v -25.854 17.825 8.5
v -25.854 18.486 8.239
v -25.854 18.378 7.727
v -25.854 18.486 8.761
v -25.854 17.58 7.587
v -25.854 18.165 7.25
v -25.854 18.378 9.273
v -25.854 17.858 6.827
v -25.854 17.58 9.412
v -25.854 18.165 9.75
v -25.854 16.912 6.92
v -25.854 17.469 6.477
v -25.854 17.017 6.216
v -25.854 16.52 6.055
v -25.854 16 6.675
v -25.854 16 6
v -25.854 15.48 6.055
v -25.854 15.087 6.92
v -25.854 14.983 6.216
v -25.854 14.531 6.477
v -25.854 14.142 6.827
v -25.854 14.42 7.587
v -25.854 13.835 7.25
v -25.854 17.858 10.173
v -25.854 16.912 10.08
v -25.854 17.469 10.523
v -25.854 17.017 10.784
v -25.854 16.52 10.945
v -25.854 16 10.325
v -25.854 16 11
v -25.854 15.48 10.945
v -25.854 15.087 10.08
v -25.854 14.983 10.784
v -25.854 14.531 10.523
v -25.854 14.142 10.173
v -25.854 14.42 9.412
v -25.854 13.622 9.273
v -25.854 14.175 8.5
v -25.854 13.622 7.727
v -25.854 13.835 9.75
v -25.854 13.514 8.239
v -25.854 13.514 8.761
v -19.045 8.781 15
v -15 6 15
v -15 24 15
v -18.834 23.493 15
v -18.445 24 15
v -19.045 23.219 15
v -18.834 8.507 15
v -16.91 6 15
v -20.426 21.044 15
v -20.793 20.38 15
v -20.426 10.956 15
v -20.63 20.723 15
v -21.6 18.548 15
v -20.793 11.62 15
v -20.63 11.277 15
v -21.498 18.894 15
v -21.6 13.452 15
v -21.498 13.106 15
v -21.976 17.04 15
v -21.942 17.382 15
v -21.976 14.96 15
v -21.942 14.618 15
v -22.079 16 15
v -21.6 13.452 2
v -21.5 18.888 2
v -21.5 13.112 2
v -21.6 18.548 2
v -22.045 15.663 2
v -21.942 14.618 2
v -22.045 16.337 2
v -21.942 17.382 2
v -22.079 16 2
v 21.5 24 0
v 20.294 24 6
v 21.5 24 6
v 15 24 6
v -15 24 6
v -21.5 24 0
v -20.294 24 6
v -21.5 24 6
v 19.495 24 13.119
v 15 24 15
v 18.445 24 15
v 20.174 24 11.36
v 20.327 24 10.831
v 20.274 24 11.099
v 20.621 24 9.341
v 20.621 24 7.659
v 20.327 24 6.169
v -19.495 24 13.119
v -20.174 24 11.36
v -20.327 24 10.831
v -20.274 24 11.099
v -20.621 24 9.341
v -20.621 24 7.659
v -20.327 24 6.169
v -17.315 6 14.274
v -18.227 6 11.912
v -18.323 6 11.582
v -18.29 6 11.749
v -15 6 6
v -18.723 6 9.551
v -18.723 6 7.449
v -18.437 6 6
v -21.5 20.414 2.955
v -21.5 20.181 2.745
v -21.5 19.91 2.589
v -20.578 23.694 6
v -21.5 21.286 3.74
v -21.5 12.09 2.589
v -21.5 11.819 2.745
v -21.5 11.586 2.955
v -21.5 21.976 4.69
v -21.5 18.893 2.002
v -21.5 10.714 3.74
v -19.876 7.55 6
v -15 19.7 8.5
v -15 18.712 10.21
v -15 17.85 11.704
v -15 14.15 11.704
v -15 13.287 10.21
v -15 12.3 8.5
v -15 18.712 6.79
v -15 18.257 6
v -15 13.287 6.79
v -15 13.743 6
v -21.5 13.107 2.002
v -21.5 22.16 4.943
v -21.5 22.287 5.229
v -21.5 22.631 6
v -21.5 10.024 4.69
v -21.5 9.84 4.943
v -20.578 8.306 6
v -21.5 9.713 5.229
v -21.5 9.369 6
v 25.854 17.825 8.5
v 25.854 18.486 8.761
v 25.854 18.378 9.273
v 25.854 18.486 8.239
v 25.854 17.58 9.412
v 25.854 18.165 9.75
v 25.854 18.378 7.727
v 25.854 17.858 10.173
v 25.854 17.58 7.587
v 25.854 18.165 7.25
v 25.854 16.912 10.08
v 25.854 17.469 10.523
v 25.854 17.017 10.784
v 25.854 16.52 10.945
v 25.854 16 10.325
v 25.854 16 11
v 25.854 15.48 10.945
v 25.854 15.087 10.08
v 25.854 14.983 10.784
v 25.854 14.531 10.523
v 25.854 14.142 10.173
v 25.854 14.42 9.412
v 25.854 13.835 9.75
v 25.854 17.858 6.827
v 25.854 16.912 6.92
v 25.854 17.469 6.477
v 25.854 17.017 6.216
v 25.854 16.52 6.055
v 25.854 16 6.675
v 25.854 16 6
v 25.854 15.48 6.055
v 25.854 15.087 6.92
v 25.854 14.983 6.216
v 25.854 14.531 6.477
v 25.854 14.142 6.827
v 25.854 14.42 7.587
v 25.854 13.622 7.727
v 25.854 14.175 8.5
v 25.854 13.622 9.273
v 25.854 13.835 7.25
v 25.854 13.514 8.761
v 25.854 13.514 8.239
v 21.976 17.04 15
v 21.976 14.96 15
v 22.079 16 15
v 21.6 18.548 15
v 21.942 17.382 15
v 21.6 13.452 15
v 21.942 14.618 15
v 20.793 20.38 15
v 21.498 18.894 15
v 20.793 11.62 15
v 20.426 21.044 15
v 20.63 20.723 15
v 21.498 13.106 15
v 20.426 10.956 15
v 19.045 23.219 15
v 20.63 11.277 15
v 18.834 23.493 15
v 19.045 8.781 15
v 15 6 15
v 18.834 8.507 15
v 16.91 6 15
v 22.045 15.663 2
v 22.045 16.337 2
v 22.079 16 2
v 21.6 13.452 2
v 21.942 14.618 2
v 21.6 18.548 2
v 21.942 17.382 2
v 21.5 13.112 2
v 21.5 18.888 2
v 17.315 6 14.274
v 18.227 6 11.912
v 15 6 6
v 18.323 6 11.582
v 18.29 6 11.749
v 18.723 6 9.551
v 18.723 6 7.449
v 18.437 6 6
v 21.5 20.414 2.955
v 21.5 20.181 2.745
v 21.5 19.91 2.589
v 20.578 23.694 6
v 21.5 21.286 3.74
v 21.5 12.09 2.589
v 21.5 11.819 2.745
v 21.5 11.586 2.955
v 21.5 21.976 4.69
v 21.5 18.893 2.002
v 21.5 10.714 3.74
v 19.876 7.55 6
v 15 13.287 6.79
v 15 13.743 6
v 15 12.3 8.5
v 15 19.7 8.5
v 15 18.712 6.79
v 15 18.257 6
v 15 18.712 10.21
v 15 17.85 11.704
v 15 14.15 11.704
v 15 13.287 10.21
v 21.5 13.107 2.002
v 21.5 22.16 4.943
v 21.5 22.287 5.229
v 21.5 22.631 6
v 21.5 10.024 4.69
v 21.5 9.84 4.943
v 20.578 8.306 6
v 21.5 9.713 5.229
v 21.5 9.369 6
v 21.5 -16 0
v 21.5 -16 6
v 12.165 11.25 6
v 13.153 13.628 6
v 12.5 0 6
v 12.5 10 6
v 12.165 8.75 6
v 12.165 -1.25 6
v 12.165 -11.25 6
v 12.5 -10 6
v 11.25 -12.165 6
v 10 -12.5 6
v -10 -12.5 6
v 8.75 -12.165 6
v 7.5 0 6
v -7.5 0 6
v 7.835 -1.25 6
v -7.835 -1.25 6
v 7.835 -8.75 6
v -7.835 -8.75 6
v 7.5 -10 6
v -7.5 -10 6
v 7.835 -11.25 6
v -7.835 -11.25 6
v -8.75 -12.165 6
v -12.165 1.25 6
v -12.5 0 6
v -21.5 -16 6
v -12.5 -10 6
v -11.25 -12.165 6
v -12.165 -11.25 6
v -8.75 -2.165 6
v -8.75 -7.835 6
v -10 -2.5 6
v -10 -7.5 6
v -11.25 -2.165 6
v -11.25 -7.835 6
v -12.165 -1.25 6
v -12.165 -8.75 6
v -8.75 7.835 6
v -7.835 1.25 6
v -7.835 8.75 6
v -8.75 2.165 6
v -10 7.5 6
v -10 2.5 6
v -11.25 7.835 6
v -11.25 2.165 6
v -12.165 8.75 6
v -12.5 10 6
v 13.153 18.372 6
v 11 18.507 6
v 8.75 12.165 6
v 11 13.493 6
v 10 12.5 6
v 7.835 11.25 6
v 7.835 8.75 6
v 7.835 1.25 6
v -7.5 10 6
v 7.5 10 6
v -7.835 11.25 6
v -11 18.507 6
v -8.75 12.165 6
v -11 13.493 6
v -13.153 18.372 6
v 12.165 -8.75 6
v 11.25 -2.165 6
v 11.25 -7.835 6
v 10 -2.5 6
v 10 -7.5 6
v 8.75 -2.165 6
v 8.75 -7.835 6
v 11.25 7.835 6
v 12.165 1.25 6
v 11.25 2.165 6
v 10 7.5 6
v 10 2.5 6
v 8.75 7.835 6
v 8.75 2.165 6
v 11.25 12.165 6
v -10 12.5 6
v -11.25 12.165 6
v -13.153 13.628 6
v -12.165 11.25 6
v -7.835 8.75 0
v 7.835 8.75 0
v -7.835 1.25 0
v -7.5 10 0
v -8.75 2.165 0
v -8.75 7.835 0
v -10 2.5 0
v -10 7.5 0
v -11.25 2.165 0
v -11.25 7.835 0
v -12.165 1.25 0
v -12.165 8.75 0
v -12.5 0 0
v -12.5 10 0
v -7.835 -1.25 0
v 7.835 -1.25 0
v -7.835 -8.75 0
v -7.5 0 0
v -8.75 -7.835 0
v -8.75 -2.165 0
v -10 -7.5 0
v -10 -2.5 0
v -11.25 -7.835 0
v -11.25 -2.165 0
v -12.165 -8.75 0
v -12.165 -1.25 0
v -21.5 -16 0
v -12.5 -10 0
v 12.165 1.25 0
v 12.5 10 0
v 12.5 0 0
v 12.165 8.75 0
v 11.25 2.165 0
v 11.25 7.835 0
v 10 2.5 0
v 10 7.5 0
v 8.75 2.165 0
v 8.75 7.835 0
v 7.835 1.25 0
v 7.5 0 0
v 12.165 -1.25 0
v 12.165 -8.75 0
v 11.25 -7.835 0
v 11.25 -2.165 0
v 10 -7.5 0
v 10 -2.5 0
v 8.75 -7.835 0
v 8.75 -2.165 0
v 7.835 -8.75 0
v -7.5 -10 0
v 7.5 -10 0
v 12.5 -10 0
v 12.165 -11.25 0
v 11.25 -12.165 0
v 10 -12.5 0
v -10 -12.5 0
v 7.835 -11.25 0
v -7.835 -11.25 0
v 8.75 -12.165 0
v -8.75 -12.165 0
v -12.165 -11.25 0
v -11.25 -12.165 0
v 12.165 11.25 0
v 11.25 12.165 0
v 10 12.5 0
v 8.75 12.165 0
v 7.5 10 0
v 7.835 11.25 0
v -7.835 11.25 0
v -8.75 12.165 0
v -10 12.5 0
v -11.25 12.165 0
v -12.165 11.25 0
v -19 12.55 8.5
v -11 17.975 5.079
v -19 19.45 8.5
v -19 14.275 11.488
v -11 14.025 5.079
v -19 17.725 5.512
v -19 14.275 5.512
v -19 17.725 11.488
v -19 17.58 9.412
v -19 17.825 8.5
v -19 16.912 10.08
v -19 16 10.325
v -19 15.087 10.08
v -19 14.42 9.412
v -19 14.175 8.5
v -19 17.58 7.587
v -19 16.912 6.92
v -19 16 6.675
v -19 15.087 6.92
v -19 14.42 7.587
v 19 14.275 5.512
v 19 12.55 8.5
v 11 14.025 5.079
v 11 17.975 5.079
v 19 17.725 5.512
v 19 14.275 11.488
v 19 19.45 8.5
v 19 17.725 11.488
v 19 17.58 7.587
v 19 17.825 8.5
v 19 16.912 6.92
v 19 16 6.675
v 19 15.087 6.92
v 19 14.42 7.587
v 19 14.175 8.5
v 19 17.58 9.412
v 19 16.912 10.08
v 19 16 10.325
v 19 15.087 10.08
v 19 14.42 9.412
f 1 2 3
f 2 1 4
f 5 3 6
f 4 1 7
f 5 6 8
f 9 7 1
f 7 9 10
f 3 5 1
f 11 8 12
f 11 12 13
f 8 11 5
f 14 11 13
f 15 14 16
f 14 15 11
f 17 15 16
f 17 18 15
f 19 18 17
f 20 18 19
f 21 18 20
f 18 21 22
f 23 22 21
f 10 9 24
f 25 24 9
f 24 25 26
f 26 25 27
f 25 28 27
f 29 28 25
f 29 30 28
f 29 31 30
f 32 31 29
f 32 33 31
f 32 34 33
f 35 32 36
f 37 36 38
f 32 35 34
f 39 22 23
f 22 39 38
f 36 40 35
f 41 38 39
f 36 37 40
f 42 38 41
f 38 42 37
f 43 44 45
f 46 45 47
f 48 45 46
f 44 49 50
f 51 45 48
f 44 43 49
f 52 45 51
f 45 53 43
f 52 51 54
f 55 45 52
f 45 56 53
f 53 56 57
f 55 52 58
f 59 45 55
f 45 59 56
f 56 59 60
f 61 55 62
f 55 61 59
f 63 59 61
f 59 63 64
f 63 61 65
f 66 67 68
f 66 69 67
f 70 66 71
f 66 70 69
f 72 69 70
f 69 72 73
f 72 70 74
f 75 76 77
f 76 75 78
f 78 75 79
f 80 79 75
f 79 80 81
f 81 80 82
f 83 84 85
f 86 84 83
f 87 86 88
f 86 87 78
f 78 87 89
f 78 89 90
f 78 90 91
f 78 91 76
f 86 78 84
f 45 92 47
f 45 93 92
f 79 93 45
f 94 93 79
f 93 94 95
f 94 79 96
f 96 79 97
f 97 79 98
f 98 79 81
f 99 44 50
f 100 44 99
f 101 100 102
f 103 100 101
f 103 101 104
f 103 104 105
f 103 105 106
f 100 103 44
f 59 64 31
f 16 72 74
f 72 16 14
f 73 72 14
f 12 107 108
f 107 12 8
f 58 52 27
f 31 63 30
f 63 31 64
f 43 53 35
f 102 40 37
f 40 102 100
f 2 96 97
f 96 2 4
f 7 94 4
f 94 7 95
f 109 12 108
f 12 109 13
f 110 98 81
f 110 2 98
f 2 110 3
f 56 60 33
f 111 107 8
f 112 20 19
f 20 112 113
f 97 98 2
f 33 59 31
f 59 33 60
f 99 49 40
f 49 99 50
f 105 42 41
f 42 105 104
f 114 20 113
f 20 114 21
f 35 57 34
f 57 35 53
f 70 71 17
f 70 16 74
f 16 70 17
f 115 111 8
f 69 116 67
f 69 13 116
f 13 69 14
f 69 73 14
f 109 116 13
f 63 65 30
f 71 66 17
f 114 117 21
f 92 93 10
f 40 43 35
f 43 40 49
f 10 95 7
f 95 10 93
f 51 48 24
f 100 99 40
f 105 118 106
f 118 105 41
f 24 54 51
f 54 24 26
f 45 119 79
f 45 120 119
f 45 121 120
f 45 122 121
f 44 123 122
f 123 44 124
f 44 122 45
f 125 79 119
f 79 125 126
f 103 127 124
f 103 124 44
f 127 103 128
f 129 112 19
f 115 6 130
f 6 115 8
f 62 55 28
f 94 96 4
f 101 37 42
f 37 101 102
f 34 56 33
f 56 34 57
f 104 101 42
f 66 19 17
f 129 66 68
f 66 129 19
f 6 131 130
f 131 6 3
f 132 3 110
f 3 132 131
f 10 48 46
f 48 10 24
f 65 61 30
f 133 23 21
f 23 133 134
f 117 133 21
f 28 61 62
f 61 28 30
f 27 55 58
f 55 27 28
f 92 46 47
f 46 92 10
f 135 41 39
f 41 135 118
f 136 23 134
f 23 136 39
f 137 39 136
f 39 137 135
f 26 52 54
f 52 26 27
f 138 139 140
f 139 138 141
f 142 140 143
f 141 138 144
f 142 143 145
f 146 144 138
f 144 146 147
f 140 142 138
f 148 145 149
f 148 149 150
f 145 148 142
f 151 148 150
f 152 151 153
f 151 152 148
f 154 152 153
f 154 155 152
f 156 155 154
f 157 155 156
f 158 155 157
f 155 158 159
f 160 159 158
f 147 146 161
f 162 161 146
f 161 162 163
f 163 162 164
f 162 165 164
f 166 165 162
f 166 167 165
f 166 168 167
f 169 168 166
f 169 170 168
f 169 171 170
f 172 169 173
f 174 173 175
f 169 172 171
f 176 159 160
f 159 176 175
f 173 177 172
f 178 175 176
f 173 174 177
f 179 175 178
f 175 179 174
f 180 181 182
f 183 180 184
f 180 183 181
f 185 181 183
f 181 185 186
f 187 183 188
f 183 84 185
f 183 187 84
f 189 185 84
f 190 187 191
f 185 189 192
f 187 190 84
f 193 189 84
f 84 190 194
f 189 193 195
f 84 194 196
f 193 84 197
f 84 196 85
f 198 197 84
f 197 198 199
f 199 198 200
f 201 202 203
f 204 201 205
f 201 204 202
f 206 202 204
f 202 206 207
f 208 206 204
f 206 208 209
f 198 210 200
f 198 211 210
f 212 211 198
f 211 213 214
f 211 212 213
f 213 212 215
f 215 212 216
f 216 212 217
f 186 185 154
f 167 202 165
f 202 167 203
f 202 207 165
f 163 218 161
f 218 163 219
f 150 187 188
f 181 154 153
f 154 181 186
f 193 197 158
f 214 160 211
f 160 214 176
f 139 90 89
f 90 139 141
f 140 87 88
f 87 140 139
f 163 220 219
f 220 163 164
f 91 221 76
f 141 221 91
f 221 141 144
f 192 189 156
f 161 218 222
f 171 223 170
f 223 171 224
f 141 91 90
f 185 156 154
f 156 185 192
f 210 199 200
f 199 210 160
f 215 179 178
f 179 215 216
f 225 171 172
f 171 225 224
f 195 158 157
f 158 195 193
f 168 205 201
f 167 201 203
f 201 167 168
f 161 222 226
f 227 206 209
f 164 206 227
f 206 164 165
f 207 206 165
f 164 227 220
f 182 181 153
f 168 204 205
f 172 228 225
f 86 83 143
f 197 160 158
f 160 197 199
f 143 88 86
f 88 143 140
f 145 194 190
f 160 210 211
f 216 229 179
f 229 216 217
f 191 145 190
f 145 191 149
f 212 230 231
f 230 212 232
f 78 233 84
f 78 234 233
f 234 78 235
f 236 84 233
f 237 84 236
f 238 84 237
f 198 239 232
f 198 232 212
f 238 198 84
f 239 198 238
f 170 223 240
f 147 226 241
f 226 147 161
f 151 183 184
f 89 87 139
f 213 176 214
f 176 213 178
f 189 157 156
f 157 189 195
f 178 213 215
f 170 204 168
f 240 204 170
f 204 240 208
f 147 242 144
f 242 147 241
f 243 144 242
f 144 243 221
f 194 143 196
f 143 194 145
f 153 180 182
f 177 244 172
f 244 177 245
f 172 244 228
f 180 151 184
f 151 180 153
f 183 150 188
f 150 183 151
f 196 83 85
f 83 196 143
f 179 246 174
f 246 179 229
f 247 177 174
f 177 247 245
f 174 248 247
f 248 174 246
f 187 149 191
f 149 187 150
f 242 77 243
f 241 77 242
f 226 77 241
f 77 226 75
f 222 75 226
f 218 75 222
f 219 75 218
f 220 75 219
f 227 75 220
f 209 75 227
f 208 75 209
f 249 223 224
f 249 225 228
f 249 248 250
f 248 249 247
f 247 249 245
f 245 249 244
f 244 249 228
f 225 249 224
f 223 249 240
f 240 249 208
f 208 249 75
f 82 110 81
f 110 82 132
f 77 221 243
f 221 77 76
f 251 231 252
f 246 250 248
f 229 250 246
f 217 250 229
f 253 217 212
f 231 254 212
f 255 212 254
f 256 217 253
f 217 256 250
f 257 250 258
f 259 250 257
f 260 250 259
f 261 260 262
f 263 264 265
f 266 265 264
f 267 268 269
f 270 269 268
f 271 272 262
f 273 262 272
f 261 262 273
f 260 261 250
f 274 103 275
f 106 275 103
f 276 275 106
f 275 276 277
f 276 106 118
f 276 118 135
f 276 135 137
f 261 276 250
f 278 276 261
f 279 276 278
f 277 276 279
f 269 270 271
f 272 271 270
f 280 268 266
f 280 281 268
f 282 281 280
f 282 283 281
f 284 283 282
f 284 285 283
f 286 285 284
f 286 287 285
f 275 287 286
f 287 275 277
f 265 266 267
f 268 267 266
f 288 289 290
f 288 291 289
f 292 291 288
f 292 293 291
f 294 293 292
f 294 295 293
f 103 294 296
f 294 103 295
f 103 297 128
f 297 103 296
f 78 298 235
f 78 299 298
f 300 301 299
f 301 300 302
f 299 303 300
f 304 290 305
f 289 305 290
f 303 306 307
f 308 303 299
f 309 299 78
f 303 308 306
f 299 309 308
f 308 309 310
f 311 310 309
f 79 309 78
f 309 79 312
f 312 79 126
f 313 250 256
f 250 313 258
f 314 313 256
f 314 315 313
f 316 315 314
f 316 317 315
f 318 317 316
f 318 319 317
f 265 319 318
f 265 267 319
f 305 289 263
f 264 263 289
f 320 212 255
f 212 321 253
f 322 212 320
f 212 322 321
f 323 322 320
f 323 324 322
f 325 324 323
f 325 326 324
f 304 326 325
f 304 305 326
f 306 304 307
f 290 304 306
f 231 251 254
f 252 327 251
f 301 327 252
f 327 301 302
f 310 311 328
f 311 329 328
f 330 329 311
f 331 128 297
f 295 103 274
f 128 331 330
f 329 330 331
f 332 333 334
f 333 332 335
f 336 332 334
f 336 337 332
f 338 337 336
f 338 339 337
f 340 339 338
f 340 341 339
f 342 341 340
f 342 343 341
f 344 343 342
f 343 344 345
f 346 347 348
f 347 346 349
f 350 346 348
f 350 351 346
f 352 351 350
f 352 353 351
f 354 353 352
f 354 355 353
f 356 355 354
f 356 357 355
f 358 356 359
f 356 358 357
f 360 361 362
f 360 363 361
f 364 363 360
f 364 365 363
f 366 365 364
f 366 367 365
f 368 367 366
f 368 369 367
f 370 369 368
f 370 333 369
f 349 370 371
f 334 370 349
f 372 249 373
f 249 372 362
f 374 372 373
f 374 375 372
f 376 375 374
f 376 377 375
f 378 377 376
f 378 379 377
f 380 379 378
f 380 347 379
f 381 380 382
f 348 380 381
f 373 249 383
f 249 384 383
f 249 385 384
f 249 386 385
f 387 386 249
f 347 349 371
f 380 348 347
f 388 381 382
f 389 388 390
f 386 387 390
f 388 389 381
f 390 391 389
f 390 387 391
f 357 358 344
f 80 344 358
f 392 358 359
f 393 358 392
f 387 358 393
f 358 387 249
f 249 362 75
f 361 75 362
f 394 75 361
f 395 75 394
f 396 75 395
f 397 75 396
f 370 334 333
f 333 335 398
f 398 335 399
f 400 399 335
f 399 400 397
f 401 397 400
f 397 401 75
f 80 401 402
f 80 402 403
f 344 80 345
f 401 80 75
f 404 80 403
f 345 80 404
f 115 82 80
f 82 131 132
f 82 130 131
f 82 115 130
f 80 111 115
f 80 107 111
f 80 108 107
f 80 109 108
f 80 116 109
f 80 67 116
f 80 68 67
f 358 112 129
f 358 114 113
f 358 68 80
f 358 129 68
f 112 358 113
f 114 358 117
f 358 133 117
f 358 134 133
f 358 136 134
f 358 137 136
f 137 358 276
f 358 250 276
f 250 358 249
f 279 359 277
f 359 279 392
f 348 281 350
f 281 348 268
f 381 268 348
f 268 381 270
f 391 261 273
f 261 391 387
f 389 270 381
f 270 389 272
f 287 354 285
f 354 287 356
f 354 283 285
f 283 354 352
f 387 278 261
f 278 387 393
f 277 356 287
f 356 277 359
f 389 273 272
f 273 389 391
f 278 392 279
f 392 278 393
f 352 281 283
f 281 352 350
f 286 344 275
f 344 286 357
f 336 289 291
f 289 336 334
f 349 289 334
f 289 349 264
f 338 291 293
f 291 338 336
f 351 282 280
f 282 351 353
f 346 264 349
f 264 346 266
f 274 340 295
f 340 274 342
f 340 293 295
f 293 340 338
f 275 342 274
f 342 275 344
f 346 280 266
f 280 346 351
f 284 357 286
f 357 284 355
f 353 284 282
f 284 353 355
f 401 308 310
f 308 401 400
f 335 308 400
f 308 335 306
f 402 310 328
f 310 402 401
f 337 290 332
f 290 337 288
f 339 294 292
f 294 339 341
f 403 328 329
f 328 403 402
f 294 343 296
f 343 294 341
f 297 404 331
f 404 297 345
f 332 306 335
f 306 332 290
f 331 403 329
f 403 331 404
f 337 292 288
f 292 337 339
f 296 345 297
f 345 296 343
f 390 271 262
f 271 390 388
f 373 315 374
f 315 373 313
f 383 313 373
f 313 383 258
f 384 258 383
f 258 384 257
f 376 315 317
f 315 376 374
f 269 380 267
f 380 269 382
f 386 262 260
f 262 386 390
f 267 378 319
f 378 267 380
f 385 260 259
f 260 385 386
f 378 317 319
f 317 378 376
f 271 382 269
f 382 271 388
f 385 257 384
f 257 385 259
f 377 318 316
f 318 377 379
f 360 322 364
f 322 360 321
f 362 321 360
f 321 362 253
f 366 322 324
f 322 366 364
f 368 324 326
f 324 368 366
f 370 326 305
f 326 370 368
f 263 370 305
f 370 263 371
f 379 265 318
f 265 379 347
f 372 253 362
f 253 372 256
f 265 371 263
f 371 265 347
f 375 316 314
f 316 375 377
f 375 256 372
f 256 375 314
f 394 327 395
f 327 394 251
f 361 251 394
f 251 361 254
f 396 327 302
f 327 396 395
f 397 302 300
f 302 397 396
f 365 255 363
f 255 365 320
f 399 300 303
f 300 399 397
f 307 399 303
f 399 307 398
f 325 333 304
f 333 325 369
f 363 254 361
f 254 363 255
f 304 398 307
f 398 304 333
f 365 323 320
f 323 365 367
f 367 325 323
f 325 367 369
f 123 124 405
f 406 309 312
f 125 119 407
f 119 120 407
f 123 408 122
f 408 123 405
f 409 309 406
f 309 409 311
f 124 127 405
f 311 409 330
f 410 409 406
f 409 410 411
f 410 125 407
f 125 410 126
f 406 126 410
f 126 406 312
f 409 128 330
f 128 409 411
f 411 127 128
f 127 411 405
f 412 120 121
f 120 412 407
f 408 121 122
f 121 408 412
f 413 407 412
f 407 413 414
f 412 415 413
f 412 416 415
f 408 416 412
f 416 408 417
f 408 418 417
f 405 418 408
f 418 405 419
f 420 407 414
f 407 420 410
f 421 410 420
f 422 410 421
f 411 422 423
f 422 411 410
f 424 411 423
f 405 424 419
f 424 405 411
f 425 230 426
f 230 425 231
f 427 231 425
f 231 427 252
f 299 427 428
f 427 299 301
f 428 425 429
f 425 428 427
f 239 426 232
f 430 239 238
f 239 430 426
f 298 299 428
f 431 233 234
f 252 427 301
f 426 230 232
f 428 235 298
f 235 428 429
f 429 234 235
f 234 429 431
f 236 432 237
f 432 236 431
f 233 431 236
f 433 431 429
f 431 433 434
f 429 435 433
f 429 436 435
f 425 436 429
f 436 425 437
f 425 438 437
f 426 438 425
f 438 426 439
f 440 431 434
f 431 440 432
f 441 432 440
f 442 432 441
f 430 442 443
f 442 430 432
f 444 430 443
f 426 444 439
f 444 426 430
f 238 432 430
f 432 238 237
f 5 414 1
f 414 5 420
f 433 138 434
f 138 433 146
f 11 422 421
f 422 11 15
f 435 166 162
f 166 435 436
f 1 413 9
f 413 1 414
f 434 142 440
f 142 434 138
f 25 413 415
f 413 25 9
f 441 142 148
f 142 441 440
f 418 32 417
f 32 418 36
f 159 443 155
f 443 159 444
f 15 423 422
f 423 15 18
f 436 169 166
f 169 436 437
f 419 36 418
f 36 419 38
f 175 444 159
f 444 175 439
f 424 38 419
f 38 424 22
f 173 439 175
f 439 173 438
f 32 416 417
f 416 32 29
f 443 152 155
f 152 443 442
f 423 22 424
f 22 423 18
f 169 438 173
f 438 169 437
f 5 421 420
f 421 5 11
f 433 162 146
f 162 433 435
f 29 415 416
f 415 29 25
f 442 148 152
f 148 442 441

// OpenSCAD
// file: carriage_plate_standard_c14005_rev_2.scad
// MakerSlide Component
// http://www.makerslide.com
// c14005_rev_2
// Standard Wheel Carriage Plate
// Original by Barton Dring
// OpenSCAD model by Mike Sheldrake

centeredCarriagePlate();

module centeredCarriagePlate() {
	translate([-90/2,-160/2,0]) standard_wheel_carriage_plate();
}

module standard_wheel_carriage_plate(thickness=3.175) {
color([175/255,178/255,183/255])
difference() {

// 90mm by 160mm plate 
// 3.175mm thick by default,
// but you can pass a different thickness to this module
cube([90,160,3.175],center=false);

// 5mm diam. holes
for(i=[
  [12.7,10],
  [12.7,30],
  [12.7,70],
  [12.7,80],
  [12.7,90],
  [12.7,112.3],
  [12.7,130],
  [12.7,150],
  [35,10],
  [35,60],
  [35,80],
  [35,100],
  [35,150],
  [45,70],
  [45,90],
  [55,10],
  [55,60],
  [55,80],
  [55,100],
  [55,150],
  [77.3,30],
  [77.3,70],
  [77.3,90],
  [77.3,112.3],
  [77.3,130],

  //These are 5mm holes in the 7mm hole spots that we will do next.
  //For some reason including them here too makes the OpenCSG display look right.
  //Not needed for CGAL render though.
  [12.7,47.7],
  [45,47.7],
  [77.3,10],
  [77.3,47.7],
  [77.3,80],
  [77.3,150]

  ]) { translate([i[0],i[1],-0.2]) cylinder(h=thickness+1,r=5/2,center=false); }

// 7mm diam. holes 
for(i=[
  [12.7,47.7],
  [45,47.7],
  [77.3,10],
  [77.3,47.7],
  [77.3,80],
  [77.3,150]
  ]) { translate([i[0],i[1],-0.2]) cylinder(h=thickness+1,r=7/2,center=false); }

// rounded corners on plate 
for(i=[
  [0,0,0],
  [90,160,180],
  [90,0,90],
  [0,160,270]
  ]
  ) {
	translate([i[0],i[1],0]) rotate(a=[0,0,i[2]]) translate([10,10,-0.1]) rotate(a=[0,0,180]) difference() {
		cube([11,11,thickness+1],center=false);
		translate([0,0,-0.1]) cylinder(h=thickness+2,r=10,center=false);
		}
	}
}
}
// file: configuration.scad
// Increase this if your slicer or printer make holes too tight.
extra_radius = 0.2;

// OD = outside diameter, corner to corner.
m3_nut_od = 6.1;
m3_nut_radius = m3_nut_od/2 + 0.2 + extra_radius;

// Major diameter of metric 3mm thread.
m3_major = 2.85;
m3_radius = m3_major/2 + extra_radius;
m3_wide_radius = m3_major/2 + 0.2 + extra_radius;

// NEMA17 stepper motors.
motor_shaft_diameter = 5;
motor_shaft_radius = motor_shaft_diameter/2 + extra_radius;

// Frame brackets.
thickness = 3.6;
// main file
/*
 * Based on Johanns mini kossel design
 * https://github.com/jcrocholl/kossel
 */
include <configuration.scad>;

use <carriage_plate_standard_c14005_rev_2.scad>

//separation = 40;
ratio= 1.39;
separation = 37.2*ratio;
echo(str("Separation= ", separation));

thickness = 6;

horn_thickness = 13;
horn_x = 15;
horn_offset = 2;

belt_width = 6;
belt_x = 5.6;
belt_z = 7;

module carriage() {
  // Timing belt (up and down).
  translate([-belt_x, 0, belt_z + belt_width/2]) %
    cube([1.7, 100, belt_width], center=true);
  translate([belt_x, 0, belt_z + belt_width/2]) %
    cube([1.7, 100, belt_width], center=true);
  difference() {
    union() {
      // Main body.
      translate([0, 4, thickness/2])
        cube([43, 40, thickness], center=true);
      // Ball joint mount horns.
      for (x = [-1, 1]) {
        scale([x, 1, 1]) intersection() {
          translate([0, 15, horn_thickness/2+horn_offset])
            cube([separation, 18, horn_thickness], center=true);
          translate([horn_x, 16, horn_thickness/2+horn_offset]) rotate([0, 90, 0])
            cylinder(r1=14, r2=2.5, h=separation/2-horn_x);
        }
      }
      // Belt clamps.
      *difference() {
        union() {
          translate([6.5, -2.5, horn_thickness/2+1])
            cube([14, 7, horn_thickness-2], center=true);
          translate([10.75, 2.5, horn_thickness/2+1])
            cube([5.5, 16, horn_thickness-2], center=true);
        }
        // Avoid touching diagonal push rods (carbon tube).
        translate([20, -10, 12.5]) rotate([35, 35, 30])
          cube([40, 40, 20], center=true);
      }
      *for (y = [-12, 7]) {
        translate([1.25, y, horn_thickness/2+1])
          cube([7, 8, horn_thickness-2], center=true);
      }
    }
    // Screws for linear slider.
    for (x = [-10, 10]) {
      for (y = [-10, 0, 10]) {
        translate([x, y, thickness]) #
          cylinder(r=5/2, h=30, center=true, $fn=12);
      }
    }
    // Screws for ball joints.
    translate([0, 16, horn_thickness/2+horn_offset]) rotate([0, 90, 0]) #
      cylinder(r=m3_wide_radius, h=60, center=true, $fn=12);
    // Lock nuts for ball joints.
    for (x = [-1, 1]) {
      scale([x, 1, 1]) intersection() {
        translate([horn_x, 16, horn_thickness/2+horn_offset]) rotate([90, 0, -90])
          cylinder(r1=m3_nut_radius, r2=m3_nut_radius+0.5, h=8,
                   center=true, $fn=6);
      }
    }
  }
}

carriage();

//%translate([0,-10,-3.175]) rotate([0,0,0]) translate([-90/2,-160/2,0]) standard_wheel_carriage_plate();
%translate([0,0,-3.175]) rotate([0,0,90]) translate([-90/2,-160/2,0]) standard_wheel_carriage_plate();
